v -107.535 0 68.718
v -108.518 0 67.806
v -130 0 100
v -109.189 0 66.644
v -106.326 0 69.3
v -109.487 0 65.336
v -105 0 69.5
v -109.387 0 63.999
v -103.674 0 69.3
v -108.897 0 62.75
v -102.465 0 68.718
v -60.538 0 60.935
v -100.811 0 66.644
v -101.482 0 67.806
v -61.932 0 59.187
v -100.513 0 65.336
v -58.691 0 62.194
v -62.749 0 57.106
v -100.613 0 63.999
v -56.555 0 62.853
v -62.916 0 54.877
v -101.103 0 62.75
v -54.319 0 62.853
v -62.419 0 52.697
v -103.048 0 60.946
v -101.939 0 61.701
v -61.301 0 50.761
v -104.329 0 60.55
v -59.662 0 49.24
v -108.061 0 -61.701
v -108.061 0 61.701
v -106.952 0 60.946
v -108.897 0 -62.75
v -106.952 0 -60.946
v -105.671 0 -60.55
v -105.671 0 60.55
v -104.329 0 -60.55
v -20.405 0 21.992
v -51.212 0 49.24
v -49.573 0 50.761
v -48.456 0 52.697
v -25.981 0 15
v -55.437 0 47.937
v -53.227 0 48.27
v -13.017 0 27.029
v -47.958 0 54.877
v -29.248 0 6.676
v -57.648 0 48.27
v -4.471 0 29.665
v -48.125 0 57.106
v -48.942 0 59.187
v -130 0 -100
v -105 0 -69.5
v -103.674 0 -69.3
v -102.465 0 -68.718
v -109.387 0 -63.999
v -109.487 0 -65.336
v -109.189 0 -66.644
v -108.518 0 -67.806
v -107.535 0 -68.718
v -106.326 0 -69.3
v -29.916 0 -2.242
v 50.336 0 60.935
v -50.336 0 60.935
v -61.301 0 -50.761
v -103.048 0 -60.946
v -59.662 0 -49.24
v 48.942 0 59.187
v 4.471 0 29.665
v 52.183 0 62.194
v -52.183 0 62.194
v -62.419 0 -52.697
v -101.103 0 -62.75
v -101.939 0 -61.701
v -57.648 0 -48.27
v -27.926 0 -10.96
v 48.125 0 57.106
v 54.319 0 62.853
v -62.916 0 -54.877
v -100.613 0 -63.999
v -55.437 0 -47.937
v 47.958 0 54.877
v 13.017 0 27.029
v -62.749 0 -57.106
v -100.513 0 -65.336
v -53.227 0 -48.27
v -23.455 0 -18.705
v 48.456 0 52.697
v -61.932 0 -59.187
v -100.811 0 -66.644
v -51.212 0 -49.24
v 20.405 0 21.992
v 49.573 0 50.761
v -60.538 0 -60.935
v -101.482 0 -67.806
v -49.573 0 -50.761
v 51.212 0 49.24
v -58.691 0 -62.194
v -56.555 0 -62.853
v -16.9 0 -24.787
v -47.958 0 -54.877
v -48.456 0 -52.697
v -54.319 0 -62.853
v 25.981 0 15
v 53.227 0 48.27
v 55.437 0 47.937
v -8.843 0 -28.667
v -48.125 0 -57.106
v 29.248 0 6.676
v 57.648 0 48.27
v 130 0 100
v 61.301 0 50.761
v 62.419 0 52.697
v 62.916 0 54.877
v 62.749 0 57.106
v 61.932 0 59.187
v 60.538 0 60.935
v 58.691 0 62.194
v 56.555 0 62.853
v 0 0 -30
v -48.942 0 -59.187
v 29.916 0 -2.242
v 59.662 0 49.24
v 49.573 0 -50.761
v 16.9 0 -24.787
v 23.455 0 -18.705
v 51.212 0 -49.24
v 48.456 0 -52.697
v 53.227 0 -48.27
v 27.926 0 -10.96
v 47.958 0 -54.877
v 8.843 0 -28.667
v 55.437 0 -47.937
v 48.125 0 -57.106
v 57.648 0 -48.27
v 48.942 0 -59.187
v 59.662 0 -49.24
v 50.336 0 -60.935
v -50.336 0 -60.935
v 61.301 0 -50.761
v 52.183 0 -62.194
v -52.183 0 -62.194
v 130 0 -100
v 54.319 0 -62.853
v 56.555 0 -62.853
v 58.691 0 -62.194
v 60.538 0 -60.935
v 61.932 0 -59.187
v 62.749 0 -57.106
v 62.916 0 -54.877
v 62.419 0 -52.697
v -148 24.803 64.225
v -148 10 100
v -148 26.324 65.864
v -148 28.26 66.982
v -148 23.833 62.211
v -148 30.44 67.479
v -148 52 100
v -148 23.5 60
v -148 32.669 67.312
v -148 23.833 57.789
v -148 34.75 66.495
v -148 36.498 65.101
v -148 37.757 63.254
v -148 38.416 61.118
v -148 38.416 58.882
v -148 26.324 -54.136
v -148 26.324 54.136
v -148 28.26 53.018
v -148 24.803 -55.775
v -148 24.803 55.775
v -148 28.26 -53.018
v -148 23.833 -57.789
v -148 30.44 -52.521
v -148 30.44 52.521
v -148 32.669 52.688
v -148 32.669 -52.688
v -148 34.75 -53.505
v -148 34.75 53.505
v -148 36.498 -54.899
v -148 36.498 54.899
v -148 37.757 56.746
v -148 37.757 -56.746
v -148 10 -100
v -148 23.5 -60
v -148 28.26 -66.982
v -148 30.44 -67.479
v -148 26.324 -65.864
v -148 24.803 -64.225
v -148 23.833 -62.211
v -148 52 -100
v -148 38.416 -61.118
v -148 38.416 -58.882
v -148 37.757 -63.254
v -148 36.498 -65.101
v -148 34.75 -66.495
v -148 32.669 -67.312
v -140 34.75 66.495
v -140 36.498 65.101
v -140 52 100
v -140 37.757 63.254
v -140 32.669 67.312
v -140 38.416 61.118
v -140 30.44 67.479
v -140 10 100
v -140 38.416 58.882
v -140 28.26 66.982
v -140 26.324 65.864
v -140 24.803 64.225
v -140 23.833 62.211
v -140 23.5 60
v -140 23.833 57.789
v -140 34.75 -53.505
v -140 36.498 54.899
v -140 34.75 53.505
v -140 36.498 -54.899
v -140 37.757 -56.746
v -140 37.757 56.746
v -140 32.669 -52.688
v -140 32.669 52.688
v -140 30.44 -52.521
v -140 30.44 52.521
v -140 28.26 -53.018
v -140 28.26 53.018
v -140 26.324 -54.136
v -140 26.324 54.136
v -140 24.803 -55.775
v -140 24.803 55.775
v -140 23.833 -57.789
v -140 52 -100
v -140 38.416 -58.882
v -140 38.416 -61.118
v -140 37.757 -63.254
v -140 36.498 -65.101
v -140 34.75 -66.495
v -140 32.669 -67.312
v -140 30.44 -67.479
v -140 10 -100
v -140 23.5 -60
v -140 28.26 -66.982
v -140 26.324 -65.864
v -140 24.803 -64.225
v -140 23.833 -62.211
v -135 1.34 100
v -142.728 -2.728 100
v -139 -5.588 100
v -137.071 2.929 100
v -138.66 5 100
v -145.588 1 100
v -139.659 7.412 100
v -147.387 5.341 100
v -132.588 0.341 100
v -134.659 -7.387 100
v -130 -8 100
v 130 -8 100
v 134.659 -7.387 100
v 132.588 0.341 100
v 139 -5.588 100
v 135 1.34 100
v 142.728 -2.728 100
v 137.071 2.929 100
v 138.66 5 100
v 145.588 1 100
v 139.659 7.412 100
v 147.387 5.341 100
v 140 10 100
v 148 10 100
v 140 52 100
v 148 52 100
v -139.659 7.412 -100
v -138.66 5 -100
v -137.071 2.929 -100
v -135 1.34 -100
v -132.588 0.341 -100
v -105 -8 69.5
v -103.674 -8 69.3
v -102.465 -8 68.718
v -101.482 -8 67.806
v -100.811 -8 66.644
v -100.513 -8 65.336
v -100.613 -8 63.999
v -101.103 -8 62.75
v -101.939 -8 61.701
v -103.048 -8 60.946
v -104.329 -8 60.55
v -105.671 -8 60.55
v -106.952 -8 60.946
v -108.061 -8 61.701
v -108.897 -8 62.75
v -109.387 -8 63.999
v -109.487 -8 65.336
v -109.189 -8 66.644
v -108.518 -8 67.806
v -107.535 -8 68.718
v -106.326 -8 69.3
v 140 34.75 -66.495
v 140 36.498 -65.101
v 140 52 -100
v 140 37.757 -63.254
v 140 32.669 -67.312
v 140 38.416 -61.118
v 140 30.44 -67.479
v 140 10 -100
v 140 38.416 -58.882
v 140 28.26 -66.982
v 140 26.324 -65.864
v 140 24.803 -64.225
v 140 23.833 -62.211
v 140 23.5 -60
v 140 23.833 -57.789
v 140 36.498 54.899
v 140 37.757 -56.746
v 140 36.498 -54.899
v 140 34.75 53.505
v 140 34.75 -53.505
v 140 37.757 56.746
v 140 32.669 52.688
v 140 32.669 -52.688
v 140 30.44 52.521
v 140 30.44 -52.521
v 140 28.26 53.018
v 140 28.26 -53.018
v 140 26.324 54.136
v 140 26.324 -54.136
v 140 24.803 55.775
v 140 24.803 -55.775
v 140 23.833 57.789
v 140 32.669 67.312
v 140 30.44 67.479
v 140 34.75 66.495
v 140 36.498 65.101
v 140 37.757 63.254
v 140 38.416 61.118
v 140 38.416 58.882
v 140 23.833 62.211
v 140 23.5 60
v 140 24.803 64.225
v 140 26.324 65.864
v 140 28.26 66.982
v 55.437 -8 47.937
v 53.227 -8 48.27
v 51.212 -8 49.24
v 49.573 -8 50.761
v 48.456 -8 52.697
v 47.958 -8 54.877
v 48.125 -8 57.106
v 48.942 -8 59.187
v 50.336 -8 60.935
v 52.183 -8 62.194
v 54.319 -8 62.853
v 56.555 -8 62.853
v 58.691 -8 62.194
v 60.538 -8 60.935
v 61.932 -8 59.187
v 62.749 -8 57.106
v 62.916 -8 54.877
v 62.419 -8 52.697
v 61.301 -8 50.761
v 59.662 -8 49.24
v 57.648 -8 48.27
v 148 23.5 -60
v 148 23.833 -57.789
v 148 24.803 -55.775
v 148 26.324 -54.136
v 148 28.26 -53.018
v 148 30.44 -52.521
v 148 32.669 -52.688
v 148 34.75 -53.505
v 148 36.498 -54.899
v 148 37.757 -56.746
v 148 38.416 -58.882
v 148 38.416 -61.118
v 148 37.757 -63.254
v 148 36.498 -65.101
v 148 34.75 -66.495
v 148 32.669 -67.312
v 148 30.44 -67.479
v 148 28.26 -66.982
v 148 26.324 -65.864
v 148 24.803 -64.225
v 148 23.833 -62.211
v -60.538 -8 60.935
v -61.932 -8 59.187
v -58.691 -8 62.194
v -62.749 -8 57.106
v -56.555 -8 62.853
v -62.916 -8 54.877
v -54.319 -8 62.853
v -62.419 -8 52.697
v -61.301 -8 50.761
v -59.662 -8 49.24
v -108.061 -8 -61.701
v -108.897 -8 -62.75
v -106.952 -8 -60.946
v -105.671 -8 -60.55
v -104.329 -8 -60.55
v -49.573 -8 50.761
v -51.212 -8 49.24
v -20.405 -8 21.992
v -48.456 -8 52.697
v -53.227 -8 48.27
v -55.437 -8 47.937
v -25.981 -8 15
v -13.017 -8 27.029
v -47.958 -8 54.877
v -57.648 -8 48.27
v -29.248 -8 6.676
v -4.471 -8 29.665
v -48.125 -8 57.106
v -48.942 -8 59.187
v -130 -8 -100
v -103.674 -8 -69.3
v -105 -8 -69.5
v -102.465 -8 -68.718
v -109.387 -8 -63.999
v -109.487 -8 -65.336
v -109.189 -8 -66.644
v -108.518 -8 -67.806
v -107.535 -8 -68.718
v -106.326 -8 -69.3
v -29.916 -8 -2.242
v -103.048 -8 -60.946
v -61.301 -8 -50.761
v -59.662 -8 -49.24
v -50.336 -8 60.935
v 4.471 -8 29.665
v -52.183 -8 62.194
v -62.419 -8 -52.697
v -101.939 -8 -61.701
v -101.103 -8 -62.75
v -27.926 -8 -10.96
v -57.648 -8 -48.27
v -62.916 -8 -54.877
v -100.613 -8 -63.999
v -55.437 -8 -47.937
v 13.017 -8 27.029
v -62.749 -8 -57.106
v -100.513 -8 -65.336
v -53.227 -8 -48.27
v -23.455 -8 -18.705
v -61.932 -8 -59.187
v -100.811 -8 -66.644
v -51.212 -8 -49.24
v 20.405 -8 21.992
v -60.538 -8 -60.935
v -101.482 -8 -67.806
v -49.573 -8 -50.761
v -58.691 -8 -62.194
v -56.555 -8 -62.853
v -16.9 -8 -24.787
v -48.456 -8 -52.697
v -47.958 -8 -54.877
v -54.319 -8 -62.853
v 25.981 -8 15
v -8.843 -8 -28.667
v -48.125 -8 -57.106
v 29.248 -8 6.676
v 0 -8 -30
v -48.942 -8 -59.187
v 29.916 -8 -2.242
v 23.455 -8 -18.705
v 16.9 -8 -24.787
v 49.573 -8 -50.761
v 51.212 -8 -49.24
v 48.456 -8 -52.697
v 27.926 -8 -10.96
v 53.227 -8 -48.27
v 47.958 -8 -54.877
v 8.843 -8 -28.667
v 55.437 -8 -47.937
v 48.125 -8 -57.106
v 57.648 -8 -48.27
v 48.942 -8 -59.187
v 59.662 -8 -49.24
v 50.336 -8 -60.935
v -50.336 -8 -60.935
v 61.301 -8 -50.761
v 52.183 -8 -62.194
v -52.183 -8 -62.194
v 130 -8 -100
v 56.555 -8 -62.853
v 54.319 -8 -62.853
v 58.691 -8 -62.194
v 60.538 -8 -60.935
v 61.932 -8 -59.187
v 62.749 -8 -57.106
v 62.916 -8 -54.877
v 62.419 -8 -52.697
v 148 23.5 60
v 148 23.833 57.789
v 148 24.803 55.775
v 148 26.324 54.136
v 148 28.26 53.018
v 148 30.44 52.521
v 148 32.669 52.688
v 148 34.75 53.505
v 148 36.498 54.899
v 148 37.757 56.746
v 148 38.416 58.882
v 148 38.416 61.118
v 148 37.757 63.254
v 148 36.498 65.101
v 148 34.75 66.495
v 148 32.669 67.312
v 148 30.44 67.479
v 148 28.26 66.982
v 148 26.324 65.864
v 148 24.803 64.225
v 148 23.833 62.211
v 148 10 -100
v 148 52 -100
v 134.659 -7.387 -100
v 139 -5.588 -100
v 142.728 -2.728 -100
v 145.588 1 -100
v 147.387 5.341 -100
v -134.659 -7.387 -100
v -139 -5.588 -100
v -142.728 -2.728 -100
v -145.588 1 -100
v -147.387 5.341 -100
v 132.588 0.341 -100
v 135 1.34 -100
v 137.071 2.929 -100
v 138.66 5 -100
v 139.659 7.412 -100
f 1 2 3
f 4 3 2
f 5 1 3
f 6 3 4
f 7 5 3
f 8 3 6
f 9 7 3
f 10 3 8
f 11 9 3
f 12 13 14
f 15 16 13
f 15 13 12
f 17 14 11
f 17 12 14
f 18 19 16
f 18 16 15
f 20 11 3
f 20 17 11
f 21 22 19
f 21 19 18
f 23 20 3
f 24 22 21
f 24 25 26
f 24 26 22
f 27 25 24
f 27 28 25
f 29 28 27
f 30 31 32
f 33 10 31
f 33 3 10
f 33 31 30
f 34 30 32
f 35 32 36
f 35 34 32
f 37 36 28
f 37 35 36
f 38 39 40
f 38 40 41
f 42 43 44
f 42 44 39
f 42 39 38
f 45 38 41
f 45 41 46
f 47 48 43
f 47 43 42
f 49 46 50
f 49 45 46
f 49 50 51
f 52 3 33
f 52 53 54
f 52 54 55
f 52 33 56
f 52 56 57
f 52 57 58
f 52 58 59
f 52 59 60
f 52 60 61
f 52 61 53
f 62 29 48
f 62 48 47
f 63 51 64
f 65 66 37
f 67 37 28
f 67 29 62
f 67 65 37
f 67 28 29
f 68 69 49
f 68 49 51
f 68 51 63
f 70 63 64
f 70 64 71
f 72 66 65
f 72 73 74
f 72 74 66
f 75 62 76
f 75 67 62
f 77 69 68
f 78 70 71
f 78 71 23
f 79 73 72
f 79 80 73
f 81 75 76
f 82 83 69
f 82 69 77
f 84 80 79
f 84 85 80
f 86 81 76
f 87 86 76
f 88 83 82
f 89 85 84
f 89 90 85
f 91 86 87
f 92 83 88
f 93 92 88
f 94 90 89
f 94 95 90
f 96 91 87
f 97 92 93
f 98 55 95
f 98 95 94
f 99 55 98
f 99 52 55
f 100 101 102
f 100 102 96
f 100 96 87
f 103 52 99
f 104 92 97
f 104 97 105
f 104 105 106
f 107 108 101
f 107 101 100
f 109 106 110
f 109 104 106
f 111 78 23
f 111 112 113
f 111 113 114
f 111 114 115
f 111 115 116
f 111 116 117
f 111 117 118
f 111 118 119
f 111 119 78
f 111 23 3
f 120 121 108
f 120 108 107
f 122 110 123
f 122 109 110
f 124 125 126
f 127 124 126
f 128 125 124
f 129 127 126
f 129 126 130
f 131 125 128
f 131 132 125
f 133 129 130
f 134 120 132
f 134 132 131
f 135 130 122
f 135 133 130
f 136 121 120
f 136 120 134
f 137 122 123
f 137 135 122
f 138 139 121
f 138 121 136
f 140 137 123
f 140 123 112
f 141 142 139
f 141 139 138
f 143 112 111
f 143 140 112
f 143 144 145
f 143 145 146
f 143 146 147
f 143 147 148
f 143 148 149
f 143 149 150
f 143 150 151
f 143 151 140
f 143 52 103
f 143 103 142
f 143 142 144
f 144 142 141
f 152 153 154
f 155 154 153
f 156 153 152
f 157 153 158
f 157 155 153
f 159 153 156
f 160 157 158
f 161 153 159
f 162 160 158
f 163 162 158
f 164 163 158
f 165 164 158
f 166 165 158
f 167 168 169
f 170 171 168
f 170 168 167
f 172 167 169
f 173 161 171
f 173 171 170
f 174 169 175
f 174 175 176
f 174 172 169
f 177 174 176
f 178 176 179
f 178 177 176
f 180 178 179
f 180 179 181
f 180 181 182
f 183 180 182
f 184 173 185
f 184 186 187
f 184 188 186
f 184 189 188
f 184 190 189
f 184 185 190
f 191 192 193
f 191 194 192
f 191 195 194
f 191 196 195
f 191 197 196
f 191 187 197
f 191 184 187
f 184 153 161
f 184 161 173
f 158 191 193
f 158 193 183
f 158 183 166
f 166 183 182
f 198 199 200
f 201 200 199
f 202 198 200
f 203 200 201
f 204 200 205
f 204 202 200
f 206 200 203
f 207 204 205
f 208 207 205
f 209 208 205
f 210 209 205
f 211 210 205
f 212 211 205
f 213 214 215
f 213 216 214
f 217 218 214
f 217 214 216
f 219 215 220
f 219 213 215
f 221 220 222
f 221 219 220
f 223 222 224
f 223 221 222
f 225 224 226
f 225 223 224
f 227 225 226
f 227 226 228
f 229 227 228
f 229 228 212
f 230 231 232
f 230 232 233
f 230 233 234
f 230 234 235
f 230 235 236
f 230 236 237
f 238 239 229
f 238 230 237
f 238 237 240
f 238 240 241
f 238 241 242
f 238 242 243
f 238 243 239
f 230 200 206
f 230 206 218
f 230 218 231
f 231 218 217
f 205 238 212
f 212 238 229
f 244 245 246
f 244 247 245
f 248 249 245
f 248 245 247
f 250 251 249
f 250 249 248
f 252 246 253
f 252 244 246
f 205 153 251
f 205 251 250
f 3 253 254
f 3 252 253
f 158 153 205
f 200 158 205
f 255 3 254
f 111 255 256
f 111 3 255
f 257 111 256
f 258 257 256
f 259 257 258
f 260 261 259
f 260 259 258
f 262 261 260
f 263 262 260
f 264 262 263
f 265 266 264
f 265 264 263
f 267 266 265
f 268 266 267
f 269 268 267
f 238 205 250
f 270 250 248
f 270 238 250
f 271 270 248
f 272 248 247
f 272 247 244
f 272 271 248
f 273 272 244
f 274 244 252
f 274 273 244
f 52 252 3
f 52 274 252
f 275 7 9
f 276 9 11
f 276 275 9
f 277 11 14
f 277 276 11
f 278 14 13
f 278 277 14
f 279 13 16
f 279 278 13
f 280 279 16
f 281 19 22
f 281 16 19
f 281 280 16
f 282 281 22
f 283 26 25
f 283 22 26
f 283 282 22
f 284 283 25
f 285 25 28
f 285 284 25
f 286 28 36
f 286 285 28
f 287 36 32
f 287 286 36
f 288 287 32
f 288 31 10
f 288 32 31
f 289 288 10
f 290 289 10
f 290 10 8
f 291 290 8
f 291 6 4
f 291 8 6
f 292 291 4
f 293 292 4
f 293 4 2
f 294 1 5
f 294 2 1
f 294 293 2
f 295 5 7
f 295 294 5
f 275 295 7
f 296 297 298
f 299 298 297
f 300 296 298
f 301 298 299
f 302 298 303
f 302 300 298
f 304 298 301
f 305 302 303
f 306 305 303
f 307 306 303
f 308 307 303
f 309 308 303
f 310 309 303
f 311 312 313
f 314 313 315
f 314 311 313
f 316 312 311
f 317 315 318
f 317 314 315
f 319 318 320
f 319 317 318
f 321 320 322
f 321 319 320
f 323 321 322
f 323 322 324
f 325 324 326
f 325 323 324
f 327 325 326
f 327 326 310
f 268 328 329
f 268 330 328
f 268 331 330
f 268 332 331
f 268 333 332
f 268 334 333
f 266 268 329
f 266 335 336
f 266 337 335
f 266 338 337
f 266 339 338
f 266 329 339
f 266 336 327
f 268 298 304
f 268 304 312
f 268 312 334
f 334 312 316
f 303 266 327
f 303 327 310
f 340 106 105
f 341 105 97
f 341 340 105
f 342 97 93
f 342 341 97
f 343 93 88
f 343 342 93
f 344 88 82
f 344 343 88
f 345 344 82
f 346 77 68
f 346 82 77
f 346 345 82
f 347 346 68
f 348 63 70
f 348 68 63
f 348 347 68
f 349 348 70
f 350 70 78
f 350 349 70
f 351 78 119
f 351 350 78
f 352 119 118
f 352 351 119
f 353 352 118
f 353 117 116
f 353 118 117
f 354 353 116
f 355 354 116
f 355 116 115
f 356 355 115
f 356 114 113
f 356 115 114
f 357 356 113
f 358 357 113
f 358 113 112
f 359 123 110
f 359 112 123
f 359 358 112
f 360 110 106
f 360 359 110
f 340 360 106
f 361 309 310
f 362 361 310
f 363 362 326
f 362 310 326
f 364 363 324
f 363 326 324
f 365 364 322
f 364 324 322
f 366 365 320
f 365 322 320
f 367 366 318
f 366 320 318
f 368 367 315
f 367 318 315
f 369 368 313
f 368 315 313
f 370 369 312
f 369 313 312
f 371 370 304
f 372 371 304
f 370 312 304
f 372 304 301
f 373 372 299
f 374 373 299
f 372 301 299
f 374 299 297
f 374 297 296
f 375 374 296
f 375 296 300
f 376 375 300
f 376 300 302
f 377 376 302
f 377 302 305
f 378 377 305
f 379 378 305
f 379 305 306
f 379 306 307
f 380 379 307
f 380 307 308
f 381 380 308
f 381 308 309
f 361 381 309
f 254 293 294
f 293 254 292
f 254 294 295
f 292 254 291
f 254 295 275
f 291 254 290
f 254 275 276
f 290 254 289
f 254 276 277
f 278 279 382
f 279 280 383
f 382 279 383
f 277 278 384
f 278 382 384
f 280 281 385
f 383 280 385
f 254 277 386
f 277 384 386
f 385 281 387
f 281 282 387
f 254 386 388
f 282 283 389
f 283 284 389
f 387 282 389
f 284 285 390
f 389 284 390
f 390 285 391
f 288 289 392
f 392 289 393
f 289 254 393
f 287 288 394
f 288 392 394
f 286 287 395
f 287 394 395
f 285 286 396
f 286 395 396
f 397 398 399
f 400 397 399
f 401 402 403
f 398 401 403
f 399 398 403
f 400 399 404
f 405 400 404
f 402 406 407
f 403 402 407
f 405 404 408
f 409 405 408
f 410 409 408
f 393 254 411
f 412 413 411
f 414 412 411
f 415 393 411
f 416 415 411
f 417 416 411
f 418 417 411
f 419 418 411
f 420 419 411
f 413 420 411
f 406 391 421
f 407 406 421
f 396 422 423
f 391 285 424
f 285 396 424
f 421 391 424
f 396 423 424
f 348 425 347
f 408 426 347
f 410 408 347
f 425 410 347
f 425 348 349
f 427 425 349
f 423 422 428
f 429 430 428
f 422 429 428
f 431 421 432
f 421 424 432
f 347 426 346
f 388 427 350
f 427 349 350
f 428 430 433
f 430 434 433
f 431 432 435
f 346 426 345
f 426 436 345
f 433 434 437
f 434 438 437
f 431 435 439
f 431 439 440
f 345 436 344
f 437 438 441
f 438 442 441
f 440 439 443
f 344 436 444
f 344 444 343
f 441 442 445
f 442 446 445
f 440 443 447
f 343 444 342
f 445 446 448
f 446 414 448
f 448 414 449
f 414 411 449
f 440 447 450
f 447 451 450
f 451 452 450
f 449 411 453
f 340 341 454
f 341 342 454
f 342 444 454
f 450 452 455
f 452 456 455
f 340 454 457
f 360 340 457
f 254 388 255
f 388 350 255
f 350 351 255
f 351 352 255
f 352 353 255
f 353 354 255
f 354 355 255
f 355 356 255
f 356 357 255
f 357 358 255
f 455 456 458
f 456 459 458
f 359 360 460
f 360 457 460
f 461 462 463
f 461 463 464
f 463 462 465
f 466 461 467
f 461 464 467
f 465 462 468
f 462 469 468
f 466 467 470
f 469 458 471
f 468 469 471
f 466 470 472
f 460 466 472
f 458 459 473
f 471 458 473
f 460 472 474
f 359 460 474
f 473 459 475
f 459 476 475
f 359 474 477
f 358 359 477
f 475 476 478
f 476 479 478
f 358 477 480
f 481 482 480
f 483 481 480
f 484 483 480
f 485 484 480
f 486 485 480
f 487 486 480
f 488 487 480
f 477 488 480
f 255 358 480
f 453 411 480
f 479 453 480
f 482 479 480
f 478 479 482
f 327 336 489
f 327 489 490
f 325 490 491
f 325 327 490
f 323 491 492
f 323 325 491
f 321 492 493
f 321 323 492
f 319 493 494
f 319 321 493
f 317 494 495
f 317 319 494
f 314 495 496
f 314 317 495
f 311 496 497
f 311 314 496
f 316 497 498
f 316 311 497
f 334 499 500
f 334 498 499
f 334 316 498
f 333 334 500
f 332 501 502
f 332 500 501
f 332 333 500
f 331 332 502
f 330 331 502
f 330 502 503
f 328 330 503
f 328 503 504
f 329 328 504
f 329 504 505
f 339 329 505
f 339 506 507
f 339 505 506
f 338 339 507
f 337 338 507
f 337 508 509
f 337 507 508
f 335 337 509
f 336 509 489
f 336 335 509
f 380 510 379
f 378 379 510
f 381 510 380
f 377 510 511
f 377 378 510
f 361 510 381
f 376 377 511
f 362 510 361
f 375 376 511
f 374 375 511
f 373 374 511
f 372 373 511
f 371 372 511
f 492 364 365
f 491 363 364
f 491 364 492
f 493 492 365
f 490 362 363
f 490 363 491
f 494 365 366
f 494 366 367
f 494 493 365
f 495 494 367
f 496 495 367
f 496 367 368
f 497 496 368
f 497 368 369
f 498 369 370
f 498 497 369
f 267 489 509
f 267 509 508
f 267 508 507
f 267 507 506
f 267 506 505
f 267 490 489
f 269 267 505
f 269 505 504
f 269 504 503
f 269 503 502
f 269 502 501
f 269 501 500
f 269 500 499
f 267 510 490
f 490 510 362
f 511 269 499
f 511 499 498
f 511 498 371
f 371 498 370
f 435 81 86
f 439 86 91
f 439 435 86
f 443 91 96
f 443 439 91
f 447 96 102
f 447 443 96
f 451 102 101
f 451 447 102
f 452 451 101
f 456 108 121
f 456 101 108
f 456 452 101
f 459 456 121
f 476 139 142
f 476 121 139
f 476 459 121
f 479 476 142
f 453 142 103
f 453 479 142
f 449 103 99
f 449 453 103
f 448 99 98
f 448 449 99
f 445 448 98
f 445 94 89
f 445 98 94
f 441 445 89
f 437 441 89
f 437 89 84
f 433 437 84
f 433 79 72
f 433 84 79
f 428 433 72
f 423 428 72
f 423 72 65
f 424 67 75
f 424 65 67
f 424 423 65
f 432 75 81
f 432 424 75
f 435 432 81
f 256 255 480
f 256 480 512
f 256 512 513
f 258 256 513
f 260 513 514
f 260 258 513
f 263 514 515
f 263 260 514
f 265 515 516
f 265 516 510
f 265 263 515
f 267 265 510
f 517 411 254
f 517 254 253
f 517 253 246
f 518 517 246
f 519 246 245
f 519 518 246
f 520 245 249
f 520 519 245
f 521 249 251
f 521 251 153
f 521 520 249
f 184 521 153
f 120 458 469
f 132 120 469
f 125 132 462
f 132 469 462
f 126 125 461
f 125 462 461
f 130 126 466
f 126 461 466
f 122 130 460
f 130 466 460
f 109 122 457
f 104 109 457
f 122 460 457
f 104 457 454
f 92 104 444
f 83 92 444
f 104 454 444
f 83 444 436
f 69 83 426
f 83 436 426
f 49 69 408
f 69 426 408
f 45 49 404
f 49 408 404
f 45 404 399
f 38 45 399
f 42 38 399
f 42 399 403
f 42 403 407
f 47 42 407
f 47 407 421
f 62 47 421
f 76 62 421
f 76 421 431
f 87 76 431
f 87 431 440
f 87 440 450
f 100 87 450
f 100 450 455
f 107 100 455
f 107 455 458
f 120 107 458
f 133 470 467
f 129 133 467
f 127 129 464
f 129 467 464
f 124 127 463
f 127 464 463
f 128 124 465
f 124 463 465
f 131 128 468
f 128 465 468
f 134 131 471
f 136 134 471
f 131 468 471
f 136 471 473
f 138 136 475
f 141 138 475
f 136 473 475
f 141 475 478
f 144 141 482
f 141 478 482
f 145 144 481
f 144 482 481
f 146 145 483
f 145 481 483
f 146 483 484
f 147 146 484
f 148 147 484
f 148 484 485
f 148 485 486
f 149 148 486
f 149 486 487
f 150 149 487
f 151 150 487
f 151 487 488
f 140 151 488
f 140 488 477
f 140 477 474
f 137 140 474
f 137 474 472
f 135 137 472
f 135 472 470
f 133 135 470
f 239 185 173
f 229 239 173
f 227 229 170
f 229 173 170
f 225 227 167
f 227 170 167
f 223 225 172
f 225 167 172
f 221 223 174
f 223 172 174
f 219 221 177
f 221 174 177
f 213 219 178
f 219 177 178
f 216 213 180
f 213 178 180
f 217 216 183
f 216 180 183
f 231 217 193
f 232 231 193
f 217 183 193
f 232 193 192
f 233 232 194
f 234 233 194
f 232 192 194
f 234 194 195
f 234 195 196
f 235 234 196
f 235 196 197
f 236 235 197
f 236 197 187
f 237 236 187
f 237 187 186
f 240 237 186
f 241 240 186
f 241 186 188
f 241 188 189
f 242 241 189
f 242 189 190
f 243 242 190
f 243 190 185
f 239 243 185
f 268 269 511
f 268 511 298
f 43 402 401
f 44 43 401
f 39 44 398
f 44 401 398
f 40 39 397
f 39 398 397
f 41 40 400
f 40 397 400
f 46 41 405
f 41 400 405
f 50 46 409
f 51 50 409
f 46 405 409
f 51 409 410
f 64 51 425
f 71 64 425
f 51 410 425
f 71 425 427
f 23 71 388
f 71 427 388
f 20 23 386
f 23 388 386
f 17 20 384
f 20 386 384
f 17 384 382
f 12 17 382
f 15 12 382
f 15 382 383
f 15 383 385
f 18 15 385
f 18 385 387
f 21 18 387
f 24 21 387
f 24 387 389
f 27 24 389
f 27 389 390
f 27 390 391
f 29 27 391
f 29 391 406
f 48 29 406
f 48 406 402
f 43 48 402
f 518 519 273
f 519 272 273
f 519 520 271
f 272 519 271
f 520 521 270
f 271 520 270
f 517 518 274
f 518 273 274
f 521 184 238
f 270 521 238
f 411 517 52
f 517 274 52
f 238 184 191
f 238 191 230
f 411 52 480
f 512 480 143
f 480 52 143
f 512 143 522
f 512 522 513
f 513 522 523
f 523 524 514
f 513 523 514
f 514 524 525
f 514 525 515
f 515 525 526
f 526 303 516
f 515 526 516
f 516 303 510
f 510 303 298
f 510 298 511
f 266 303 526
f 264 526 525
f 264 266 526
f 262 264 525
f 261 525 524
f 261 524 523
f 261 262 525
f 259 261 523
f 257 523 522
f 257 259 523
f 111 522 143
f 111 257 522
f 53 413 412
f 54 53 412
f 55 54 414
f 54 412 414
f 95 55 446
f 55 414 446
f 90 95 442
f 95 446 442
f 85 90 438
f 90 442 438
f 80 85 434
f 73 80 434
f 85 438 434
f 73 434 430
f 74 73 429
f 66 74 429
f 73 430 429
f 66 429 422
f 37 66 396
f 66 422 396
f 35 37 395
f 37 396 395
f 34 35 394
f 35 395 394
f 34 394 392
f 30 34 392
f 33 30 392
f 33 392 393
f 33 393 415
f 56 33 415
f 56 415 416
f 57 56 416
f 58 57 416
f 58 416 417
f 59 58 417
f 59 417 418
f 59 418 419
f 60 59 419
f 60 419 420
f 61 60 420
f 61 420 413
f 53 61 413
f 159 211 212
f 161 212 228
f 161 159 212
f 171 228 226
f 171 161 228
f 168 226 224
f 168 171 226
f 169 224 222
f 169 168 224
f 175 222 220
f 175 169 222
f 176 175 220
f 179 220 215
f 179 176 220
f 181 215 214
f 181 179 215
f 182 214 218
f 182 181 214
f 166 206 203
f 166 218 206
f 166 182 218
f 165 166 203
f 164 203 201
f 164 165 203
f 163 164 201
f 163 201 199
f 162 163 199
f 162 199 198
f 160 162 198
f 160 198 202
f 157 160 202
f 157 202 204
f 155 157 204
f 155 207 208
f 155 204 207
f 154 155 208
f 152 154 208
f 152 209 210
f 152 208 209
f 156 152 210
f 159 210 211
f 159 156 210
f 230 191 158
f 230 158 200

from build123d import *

# Parameters (mm, degrees)
SKETCH1_W                      = 296
SKETCH1_H                      = 200
BASE_FLANGE1_DEPTH             = 8
EDGE_FLANGE1_STRIP_W           = 52
EDGE_FLANGE1_STRIP_H           = 8
EDGE_FLANGE1_STRIP_CUT_DEPTH   = 200
EDGE_FLANGE1_STRIP_2_W         = 52
EDGE_FLANGE1_STRIP_2_H         = 8
EDGE_FLANGE1_STRIP_CUT_2_DEPTH = 200
EDGE_FLANGE1_DEPTH             = 200
EDGE_FLANGE1_BEND_DEPTH        = 200
SKETCH12_R                     = 30
CUT_EXTRUDE1_DEPTH             = 10
SKETCH13_R                     = 7.5
CUT_EXTRUDE2_DEPTH             = 10
SKETCH15_R                     = 7.5
CUT_EXTRUDE3_DEPTH             = 317.733326317
SKETCH16_R                     = 4.5
CUT_EXTRUDE4_DEPTH             = 10
MIRROR5_COPY_1_SKETCH_R        = 7.5
MIRROR5_COPY_1_DEPTH           = 10


# Sheet-metal steps are written as plain solids
with BuildPart() as part:
    # Sketch1 → Base-Flange1 (new body)
    with BuildSketch(Plane(origin=(0, 0, 0), x_dir=(1, 0, 0), z_dir=(0, 1, 0))):
        Rectangle(SKETCH1_W, SKETCH1_H)
    extrude(amount=-BASE_FLANGE1_DEPTH)

    # Edge-Flange1 strip (across the edge) → Edge-Flange1 strip cut (cut)
    with BuildSketch(Plane(origin=(-148, 0, -100), x_dir=(1, 0, 0), z_dir=(0, 0, 1))):
        with Locations((-8, -4)):
            Rectangle(EDGE_FLANGE1_STRIP_W, EDGE_FLANGE1_STRIP_H)
    extrude(amount=EDGE_FLANGE1_STRIP_CUT_DEPTH, mode=Mode.SUBTRACT)

    # Edge-Flange1 strip 2 (across the edge) → Edge-Flange1 strip cut 2 (cut)
    with BuildSketch(Plane(origin=(148, 0, 100), x_dir=(-1, 0, 0), z_dir=(0, 0, -1))):
        with Locations((-8, -4)):
            Rectangle(EDGE_FLANGE1_STRIP_2_W, EDGE_FLANGE1_STRIP_2_H)
    extrude(amount=EDGE_FLANGE1_STRIP_CUT_2_DEPTH, mode=Mode.SUBTRACT)

    # Edge-Flange1 section (across the edge) → Edge-Flange1 (add)
    with BuildSketch(Plane(origin=(-148, 0, -100), x_dir=(1, 0, 0), z_dir=(0, 0, 1))):
        with BuildLine():
            Line((0, 10), (0, 52))
            Line((0, 52), (8, 52))
            Line((8, 52), (8, 10))
            ThreePointArc((8, 10), (10.928932188, 2.928932188), (18, 0))
            Line((18, 0), (18, -8))
            ThreePointArc((18, -8), (5.272077939, -2.727922061), (0, 10))
        make_face()
    extrude(amount=EDGE_FLANGE1_DEPTH)

    # Edge-Flange1 section 2 (across the edge) → Edge-Flange1 bend (add)
    with BuildSketch(Plane(origin=(148, 0, 100), x_dir=(-1, 0, 0), z_dir=(0, 0, -1))):
        with BuildLine():
            Line((0, 10), (0, 52))
            Line((0, 52), (8, 52))
            Line((8, 52), (8, 10))
            ThreePointArc((8, 10), (10.928932188, 2.928932188), (18, 0))
            Line((18, 0), (18, -8))
            ThreePointArc((18, -8), (5.272077939, -2.727922061), (0, 10))
        make_face()
    extrude(amount=EDGE_FLANGE1_BEND_DEPTH)

    # Sketch12 → Cut-Extrude1 (cut)
    with BuildSketch(Plane(origin=(0, -8, 0), x_dir=(-1, 0, 0), z_dir=(0, -1, 0))):
        with Locations(Location((0, 0, 0), (0, 0, 90))):
            Circle(SKETCH12_R)
    extrude(amount=-CUT_EXTRUDE1_DEPTH, mode=Mode.SUBTRACT)

    # Sketch13 → Cut-Extrude2 (cut)
    with BuildSketch(Plane(origin=(0, -8, 0), x_dir=(-1, 0, 0), z_dir=(0, -1, 0))):
        with Locations(Location((55.437171645, -55.437171645, 0), (0, 0, 90))):
            Circle(SKETCH13_R)
    cut_extrude2 = extrude(amount=-CUT_EXTRUDE2_DEPTH, mode=Mode.SUBTRACT)

    # Mirror4: Cut-Extrude2 across plane
    add(cut_extrude2.mirror(Plane(origin=(0, 0, 0), x_dir=(0, 0, 1), z_dir=(1, 0, 0))), mode=Mode.SUBTRACT)

    # Sketch15 → Cut-Extrude3 (cut, through all)
    with BuildSketch(Plane.ZY.offset(148)):
        with Locations(Location((-60, 31, 0), (0, 0, 270))):
            Circle(SKETCH15_R)
    cut_extrude3 = extrude(amount=-CUT_EXTRUDE3_DEPTH, mode=Mode.SUBTRACT)

    # Sketch16 → Cut-Extrude4 (cut)
    with BuildSketch(Plane(origin=(0, -8, 0), x_dir=(-1, 0, 0), z_dir=(0, -1, 0))):
        with Locations(Location((105, 65, 0), (0, 0, 90))):
            Circle(SKETCH16_R)
    cut_extrude4 = extrude(amount=-CUT_EXTRUDE4_DEPTH, mode=Mode.SUBTRACT)

    # Mirror5: Cut-Extrude2, Cut-Extrude3, Cut-Extrude4 across plane
    add(cut_extrude2.mirror(Plane.XY), mode=Mode.SUBTRACT)
    add(cut_extrude3.mirror(Plane.XY), mode=Mode.SUBTRACT)
    add(cut_extrude4.mirror(Plane.XY), mode=Mode.SUBTRACT)

    # Mirror5 copy 1 sketch → Mirror5 copy 1 (cut)
    with BuildSketch(Plane.XZ.offset(8)):
        with Locations(Location((55.437171645, -55.437171645, 0), (0, 0, 90))):
            Circle(MIRROR5_COPY_1_SKETCH_R)
    extrude(amount=-MIRROR5_COPY_1_DEPTH, mode=Mode.SUBTRACT)


solid = part.part
